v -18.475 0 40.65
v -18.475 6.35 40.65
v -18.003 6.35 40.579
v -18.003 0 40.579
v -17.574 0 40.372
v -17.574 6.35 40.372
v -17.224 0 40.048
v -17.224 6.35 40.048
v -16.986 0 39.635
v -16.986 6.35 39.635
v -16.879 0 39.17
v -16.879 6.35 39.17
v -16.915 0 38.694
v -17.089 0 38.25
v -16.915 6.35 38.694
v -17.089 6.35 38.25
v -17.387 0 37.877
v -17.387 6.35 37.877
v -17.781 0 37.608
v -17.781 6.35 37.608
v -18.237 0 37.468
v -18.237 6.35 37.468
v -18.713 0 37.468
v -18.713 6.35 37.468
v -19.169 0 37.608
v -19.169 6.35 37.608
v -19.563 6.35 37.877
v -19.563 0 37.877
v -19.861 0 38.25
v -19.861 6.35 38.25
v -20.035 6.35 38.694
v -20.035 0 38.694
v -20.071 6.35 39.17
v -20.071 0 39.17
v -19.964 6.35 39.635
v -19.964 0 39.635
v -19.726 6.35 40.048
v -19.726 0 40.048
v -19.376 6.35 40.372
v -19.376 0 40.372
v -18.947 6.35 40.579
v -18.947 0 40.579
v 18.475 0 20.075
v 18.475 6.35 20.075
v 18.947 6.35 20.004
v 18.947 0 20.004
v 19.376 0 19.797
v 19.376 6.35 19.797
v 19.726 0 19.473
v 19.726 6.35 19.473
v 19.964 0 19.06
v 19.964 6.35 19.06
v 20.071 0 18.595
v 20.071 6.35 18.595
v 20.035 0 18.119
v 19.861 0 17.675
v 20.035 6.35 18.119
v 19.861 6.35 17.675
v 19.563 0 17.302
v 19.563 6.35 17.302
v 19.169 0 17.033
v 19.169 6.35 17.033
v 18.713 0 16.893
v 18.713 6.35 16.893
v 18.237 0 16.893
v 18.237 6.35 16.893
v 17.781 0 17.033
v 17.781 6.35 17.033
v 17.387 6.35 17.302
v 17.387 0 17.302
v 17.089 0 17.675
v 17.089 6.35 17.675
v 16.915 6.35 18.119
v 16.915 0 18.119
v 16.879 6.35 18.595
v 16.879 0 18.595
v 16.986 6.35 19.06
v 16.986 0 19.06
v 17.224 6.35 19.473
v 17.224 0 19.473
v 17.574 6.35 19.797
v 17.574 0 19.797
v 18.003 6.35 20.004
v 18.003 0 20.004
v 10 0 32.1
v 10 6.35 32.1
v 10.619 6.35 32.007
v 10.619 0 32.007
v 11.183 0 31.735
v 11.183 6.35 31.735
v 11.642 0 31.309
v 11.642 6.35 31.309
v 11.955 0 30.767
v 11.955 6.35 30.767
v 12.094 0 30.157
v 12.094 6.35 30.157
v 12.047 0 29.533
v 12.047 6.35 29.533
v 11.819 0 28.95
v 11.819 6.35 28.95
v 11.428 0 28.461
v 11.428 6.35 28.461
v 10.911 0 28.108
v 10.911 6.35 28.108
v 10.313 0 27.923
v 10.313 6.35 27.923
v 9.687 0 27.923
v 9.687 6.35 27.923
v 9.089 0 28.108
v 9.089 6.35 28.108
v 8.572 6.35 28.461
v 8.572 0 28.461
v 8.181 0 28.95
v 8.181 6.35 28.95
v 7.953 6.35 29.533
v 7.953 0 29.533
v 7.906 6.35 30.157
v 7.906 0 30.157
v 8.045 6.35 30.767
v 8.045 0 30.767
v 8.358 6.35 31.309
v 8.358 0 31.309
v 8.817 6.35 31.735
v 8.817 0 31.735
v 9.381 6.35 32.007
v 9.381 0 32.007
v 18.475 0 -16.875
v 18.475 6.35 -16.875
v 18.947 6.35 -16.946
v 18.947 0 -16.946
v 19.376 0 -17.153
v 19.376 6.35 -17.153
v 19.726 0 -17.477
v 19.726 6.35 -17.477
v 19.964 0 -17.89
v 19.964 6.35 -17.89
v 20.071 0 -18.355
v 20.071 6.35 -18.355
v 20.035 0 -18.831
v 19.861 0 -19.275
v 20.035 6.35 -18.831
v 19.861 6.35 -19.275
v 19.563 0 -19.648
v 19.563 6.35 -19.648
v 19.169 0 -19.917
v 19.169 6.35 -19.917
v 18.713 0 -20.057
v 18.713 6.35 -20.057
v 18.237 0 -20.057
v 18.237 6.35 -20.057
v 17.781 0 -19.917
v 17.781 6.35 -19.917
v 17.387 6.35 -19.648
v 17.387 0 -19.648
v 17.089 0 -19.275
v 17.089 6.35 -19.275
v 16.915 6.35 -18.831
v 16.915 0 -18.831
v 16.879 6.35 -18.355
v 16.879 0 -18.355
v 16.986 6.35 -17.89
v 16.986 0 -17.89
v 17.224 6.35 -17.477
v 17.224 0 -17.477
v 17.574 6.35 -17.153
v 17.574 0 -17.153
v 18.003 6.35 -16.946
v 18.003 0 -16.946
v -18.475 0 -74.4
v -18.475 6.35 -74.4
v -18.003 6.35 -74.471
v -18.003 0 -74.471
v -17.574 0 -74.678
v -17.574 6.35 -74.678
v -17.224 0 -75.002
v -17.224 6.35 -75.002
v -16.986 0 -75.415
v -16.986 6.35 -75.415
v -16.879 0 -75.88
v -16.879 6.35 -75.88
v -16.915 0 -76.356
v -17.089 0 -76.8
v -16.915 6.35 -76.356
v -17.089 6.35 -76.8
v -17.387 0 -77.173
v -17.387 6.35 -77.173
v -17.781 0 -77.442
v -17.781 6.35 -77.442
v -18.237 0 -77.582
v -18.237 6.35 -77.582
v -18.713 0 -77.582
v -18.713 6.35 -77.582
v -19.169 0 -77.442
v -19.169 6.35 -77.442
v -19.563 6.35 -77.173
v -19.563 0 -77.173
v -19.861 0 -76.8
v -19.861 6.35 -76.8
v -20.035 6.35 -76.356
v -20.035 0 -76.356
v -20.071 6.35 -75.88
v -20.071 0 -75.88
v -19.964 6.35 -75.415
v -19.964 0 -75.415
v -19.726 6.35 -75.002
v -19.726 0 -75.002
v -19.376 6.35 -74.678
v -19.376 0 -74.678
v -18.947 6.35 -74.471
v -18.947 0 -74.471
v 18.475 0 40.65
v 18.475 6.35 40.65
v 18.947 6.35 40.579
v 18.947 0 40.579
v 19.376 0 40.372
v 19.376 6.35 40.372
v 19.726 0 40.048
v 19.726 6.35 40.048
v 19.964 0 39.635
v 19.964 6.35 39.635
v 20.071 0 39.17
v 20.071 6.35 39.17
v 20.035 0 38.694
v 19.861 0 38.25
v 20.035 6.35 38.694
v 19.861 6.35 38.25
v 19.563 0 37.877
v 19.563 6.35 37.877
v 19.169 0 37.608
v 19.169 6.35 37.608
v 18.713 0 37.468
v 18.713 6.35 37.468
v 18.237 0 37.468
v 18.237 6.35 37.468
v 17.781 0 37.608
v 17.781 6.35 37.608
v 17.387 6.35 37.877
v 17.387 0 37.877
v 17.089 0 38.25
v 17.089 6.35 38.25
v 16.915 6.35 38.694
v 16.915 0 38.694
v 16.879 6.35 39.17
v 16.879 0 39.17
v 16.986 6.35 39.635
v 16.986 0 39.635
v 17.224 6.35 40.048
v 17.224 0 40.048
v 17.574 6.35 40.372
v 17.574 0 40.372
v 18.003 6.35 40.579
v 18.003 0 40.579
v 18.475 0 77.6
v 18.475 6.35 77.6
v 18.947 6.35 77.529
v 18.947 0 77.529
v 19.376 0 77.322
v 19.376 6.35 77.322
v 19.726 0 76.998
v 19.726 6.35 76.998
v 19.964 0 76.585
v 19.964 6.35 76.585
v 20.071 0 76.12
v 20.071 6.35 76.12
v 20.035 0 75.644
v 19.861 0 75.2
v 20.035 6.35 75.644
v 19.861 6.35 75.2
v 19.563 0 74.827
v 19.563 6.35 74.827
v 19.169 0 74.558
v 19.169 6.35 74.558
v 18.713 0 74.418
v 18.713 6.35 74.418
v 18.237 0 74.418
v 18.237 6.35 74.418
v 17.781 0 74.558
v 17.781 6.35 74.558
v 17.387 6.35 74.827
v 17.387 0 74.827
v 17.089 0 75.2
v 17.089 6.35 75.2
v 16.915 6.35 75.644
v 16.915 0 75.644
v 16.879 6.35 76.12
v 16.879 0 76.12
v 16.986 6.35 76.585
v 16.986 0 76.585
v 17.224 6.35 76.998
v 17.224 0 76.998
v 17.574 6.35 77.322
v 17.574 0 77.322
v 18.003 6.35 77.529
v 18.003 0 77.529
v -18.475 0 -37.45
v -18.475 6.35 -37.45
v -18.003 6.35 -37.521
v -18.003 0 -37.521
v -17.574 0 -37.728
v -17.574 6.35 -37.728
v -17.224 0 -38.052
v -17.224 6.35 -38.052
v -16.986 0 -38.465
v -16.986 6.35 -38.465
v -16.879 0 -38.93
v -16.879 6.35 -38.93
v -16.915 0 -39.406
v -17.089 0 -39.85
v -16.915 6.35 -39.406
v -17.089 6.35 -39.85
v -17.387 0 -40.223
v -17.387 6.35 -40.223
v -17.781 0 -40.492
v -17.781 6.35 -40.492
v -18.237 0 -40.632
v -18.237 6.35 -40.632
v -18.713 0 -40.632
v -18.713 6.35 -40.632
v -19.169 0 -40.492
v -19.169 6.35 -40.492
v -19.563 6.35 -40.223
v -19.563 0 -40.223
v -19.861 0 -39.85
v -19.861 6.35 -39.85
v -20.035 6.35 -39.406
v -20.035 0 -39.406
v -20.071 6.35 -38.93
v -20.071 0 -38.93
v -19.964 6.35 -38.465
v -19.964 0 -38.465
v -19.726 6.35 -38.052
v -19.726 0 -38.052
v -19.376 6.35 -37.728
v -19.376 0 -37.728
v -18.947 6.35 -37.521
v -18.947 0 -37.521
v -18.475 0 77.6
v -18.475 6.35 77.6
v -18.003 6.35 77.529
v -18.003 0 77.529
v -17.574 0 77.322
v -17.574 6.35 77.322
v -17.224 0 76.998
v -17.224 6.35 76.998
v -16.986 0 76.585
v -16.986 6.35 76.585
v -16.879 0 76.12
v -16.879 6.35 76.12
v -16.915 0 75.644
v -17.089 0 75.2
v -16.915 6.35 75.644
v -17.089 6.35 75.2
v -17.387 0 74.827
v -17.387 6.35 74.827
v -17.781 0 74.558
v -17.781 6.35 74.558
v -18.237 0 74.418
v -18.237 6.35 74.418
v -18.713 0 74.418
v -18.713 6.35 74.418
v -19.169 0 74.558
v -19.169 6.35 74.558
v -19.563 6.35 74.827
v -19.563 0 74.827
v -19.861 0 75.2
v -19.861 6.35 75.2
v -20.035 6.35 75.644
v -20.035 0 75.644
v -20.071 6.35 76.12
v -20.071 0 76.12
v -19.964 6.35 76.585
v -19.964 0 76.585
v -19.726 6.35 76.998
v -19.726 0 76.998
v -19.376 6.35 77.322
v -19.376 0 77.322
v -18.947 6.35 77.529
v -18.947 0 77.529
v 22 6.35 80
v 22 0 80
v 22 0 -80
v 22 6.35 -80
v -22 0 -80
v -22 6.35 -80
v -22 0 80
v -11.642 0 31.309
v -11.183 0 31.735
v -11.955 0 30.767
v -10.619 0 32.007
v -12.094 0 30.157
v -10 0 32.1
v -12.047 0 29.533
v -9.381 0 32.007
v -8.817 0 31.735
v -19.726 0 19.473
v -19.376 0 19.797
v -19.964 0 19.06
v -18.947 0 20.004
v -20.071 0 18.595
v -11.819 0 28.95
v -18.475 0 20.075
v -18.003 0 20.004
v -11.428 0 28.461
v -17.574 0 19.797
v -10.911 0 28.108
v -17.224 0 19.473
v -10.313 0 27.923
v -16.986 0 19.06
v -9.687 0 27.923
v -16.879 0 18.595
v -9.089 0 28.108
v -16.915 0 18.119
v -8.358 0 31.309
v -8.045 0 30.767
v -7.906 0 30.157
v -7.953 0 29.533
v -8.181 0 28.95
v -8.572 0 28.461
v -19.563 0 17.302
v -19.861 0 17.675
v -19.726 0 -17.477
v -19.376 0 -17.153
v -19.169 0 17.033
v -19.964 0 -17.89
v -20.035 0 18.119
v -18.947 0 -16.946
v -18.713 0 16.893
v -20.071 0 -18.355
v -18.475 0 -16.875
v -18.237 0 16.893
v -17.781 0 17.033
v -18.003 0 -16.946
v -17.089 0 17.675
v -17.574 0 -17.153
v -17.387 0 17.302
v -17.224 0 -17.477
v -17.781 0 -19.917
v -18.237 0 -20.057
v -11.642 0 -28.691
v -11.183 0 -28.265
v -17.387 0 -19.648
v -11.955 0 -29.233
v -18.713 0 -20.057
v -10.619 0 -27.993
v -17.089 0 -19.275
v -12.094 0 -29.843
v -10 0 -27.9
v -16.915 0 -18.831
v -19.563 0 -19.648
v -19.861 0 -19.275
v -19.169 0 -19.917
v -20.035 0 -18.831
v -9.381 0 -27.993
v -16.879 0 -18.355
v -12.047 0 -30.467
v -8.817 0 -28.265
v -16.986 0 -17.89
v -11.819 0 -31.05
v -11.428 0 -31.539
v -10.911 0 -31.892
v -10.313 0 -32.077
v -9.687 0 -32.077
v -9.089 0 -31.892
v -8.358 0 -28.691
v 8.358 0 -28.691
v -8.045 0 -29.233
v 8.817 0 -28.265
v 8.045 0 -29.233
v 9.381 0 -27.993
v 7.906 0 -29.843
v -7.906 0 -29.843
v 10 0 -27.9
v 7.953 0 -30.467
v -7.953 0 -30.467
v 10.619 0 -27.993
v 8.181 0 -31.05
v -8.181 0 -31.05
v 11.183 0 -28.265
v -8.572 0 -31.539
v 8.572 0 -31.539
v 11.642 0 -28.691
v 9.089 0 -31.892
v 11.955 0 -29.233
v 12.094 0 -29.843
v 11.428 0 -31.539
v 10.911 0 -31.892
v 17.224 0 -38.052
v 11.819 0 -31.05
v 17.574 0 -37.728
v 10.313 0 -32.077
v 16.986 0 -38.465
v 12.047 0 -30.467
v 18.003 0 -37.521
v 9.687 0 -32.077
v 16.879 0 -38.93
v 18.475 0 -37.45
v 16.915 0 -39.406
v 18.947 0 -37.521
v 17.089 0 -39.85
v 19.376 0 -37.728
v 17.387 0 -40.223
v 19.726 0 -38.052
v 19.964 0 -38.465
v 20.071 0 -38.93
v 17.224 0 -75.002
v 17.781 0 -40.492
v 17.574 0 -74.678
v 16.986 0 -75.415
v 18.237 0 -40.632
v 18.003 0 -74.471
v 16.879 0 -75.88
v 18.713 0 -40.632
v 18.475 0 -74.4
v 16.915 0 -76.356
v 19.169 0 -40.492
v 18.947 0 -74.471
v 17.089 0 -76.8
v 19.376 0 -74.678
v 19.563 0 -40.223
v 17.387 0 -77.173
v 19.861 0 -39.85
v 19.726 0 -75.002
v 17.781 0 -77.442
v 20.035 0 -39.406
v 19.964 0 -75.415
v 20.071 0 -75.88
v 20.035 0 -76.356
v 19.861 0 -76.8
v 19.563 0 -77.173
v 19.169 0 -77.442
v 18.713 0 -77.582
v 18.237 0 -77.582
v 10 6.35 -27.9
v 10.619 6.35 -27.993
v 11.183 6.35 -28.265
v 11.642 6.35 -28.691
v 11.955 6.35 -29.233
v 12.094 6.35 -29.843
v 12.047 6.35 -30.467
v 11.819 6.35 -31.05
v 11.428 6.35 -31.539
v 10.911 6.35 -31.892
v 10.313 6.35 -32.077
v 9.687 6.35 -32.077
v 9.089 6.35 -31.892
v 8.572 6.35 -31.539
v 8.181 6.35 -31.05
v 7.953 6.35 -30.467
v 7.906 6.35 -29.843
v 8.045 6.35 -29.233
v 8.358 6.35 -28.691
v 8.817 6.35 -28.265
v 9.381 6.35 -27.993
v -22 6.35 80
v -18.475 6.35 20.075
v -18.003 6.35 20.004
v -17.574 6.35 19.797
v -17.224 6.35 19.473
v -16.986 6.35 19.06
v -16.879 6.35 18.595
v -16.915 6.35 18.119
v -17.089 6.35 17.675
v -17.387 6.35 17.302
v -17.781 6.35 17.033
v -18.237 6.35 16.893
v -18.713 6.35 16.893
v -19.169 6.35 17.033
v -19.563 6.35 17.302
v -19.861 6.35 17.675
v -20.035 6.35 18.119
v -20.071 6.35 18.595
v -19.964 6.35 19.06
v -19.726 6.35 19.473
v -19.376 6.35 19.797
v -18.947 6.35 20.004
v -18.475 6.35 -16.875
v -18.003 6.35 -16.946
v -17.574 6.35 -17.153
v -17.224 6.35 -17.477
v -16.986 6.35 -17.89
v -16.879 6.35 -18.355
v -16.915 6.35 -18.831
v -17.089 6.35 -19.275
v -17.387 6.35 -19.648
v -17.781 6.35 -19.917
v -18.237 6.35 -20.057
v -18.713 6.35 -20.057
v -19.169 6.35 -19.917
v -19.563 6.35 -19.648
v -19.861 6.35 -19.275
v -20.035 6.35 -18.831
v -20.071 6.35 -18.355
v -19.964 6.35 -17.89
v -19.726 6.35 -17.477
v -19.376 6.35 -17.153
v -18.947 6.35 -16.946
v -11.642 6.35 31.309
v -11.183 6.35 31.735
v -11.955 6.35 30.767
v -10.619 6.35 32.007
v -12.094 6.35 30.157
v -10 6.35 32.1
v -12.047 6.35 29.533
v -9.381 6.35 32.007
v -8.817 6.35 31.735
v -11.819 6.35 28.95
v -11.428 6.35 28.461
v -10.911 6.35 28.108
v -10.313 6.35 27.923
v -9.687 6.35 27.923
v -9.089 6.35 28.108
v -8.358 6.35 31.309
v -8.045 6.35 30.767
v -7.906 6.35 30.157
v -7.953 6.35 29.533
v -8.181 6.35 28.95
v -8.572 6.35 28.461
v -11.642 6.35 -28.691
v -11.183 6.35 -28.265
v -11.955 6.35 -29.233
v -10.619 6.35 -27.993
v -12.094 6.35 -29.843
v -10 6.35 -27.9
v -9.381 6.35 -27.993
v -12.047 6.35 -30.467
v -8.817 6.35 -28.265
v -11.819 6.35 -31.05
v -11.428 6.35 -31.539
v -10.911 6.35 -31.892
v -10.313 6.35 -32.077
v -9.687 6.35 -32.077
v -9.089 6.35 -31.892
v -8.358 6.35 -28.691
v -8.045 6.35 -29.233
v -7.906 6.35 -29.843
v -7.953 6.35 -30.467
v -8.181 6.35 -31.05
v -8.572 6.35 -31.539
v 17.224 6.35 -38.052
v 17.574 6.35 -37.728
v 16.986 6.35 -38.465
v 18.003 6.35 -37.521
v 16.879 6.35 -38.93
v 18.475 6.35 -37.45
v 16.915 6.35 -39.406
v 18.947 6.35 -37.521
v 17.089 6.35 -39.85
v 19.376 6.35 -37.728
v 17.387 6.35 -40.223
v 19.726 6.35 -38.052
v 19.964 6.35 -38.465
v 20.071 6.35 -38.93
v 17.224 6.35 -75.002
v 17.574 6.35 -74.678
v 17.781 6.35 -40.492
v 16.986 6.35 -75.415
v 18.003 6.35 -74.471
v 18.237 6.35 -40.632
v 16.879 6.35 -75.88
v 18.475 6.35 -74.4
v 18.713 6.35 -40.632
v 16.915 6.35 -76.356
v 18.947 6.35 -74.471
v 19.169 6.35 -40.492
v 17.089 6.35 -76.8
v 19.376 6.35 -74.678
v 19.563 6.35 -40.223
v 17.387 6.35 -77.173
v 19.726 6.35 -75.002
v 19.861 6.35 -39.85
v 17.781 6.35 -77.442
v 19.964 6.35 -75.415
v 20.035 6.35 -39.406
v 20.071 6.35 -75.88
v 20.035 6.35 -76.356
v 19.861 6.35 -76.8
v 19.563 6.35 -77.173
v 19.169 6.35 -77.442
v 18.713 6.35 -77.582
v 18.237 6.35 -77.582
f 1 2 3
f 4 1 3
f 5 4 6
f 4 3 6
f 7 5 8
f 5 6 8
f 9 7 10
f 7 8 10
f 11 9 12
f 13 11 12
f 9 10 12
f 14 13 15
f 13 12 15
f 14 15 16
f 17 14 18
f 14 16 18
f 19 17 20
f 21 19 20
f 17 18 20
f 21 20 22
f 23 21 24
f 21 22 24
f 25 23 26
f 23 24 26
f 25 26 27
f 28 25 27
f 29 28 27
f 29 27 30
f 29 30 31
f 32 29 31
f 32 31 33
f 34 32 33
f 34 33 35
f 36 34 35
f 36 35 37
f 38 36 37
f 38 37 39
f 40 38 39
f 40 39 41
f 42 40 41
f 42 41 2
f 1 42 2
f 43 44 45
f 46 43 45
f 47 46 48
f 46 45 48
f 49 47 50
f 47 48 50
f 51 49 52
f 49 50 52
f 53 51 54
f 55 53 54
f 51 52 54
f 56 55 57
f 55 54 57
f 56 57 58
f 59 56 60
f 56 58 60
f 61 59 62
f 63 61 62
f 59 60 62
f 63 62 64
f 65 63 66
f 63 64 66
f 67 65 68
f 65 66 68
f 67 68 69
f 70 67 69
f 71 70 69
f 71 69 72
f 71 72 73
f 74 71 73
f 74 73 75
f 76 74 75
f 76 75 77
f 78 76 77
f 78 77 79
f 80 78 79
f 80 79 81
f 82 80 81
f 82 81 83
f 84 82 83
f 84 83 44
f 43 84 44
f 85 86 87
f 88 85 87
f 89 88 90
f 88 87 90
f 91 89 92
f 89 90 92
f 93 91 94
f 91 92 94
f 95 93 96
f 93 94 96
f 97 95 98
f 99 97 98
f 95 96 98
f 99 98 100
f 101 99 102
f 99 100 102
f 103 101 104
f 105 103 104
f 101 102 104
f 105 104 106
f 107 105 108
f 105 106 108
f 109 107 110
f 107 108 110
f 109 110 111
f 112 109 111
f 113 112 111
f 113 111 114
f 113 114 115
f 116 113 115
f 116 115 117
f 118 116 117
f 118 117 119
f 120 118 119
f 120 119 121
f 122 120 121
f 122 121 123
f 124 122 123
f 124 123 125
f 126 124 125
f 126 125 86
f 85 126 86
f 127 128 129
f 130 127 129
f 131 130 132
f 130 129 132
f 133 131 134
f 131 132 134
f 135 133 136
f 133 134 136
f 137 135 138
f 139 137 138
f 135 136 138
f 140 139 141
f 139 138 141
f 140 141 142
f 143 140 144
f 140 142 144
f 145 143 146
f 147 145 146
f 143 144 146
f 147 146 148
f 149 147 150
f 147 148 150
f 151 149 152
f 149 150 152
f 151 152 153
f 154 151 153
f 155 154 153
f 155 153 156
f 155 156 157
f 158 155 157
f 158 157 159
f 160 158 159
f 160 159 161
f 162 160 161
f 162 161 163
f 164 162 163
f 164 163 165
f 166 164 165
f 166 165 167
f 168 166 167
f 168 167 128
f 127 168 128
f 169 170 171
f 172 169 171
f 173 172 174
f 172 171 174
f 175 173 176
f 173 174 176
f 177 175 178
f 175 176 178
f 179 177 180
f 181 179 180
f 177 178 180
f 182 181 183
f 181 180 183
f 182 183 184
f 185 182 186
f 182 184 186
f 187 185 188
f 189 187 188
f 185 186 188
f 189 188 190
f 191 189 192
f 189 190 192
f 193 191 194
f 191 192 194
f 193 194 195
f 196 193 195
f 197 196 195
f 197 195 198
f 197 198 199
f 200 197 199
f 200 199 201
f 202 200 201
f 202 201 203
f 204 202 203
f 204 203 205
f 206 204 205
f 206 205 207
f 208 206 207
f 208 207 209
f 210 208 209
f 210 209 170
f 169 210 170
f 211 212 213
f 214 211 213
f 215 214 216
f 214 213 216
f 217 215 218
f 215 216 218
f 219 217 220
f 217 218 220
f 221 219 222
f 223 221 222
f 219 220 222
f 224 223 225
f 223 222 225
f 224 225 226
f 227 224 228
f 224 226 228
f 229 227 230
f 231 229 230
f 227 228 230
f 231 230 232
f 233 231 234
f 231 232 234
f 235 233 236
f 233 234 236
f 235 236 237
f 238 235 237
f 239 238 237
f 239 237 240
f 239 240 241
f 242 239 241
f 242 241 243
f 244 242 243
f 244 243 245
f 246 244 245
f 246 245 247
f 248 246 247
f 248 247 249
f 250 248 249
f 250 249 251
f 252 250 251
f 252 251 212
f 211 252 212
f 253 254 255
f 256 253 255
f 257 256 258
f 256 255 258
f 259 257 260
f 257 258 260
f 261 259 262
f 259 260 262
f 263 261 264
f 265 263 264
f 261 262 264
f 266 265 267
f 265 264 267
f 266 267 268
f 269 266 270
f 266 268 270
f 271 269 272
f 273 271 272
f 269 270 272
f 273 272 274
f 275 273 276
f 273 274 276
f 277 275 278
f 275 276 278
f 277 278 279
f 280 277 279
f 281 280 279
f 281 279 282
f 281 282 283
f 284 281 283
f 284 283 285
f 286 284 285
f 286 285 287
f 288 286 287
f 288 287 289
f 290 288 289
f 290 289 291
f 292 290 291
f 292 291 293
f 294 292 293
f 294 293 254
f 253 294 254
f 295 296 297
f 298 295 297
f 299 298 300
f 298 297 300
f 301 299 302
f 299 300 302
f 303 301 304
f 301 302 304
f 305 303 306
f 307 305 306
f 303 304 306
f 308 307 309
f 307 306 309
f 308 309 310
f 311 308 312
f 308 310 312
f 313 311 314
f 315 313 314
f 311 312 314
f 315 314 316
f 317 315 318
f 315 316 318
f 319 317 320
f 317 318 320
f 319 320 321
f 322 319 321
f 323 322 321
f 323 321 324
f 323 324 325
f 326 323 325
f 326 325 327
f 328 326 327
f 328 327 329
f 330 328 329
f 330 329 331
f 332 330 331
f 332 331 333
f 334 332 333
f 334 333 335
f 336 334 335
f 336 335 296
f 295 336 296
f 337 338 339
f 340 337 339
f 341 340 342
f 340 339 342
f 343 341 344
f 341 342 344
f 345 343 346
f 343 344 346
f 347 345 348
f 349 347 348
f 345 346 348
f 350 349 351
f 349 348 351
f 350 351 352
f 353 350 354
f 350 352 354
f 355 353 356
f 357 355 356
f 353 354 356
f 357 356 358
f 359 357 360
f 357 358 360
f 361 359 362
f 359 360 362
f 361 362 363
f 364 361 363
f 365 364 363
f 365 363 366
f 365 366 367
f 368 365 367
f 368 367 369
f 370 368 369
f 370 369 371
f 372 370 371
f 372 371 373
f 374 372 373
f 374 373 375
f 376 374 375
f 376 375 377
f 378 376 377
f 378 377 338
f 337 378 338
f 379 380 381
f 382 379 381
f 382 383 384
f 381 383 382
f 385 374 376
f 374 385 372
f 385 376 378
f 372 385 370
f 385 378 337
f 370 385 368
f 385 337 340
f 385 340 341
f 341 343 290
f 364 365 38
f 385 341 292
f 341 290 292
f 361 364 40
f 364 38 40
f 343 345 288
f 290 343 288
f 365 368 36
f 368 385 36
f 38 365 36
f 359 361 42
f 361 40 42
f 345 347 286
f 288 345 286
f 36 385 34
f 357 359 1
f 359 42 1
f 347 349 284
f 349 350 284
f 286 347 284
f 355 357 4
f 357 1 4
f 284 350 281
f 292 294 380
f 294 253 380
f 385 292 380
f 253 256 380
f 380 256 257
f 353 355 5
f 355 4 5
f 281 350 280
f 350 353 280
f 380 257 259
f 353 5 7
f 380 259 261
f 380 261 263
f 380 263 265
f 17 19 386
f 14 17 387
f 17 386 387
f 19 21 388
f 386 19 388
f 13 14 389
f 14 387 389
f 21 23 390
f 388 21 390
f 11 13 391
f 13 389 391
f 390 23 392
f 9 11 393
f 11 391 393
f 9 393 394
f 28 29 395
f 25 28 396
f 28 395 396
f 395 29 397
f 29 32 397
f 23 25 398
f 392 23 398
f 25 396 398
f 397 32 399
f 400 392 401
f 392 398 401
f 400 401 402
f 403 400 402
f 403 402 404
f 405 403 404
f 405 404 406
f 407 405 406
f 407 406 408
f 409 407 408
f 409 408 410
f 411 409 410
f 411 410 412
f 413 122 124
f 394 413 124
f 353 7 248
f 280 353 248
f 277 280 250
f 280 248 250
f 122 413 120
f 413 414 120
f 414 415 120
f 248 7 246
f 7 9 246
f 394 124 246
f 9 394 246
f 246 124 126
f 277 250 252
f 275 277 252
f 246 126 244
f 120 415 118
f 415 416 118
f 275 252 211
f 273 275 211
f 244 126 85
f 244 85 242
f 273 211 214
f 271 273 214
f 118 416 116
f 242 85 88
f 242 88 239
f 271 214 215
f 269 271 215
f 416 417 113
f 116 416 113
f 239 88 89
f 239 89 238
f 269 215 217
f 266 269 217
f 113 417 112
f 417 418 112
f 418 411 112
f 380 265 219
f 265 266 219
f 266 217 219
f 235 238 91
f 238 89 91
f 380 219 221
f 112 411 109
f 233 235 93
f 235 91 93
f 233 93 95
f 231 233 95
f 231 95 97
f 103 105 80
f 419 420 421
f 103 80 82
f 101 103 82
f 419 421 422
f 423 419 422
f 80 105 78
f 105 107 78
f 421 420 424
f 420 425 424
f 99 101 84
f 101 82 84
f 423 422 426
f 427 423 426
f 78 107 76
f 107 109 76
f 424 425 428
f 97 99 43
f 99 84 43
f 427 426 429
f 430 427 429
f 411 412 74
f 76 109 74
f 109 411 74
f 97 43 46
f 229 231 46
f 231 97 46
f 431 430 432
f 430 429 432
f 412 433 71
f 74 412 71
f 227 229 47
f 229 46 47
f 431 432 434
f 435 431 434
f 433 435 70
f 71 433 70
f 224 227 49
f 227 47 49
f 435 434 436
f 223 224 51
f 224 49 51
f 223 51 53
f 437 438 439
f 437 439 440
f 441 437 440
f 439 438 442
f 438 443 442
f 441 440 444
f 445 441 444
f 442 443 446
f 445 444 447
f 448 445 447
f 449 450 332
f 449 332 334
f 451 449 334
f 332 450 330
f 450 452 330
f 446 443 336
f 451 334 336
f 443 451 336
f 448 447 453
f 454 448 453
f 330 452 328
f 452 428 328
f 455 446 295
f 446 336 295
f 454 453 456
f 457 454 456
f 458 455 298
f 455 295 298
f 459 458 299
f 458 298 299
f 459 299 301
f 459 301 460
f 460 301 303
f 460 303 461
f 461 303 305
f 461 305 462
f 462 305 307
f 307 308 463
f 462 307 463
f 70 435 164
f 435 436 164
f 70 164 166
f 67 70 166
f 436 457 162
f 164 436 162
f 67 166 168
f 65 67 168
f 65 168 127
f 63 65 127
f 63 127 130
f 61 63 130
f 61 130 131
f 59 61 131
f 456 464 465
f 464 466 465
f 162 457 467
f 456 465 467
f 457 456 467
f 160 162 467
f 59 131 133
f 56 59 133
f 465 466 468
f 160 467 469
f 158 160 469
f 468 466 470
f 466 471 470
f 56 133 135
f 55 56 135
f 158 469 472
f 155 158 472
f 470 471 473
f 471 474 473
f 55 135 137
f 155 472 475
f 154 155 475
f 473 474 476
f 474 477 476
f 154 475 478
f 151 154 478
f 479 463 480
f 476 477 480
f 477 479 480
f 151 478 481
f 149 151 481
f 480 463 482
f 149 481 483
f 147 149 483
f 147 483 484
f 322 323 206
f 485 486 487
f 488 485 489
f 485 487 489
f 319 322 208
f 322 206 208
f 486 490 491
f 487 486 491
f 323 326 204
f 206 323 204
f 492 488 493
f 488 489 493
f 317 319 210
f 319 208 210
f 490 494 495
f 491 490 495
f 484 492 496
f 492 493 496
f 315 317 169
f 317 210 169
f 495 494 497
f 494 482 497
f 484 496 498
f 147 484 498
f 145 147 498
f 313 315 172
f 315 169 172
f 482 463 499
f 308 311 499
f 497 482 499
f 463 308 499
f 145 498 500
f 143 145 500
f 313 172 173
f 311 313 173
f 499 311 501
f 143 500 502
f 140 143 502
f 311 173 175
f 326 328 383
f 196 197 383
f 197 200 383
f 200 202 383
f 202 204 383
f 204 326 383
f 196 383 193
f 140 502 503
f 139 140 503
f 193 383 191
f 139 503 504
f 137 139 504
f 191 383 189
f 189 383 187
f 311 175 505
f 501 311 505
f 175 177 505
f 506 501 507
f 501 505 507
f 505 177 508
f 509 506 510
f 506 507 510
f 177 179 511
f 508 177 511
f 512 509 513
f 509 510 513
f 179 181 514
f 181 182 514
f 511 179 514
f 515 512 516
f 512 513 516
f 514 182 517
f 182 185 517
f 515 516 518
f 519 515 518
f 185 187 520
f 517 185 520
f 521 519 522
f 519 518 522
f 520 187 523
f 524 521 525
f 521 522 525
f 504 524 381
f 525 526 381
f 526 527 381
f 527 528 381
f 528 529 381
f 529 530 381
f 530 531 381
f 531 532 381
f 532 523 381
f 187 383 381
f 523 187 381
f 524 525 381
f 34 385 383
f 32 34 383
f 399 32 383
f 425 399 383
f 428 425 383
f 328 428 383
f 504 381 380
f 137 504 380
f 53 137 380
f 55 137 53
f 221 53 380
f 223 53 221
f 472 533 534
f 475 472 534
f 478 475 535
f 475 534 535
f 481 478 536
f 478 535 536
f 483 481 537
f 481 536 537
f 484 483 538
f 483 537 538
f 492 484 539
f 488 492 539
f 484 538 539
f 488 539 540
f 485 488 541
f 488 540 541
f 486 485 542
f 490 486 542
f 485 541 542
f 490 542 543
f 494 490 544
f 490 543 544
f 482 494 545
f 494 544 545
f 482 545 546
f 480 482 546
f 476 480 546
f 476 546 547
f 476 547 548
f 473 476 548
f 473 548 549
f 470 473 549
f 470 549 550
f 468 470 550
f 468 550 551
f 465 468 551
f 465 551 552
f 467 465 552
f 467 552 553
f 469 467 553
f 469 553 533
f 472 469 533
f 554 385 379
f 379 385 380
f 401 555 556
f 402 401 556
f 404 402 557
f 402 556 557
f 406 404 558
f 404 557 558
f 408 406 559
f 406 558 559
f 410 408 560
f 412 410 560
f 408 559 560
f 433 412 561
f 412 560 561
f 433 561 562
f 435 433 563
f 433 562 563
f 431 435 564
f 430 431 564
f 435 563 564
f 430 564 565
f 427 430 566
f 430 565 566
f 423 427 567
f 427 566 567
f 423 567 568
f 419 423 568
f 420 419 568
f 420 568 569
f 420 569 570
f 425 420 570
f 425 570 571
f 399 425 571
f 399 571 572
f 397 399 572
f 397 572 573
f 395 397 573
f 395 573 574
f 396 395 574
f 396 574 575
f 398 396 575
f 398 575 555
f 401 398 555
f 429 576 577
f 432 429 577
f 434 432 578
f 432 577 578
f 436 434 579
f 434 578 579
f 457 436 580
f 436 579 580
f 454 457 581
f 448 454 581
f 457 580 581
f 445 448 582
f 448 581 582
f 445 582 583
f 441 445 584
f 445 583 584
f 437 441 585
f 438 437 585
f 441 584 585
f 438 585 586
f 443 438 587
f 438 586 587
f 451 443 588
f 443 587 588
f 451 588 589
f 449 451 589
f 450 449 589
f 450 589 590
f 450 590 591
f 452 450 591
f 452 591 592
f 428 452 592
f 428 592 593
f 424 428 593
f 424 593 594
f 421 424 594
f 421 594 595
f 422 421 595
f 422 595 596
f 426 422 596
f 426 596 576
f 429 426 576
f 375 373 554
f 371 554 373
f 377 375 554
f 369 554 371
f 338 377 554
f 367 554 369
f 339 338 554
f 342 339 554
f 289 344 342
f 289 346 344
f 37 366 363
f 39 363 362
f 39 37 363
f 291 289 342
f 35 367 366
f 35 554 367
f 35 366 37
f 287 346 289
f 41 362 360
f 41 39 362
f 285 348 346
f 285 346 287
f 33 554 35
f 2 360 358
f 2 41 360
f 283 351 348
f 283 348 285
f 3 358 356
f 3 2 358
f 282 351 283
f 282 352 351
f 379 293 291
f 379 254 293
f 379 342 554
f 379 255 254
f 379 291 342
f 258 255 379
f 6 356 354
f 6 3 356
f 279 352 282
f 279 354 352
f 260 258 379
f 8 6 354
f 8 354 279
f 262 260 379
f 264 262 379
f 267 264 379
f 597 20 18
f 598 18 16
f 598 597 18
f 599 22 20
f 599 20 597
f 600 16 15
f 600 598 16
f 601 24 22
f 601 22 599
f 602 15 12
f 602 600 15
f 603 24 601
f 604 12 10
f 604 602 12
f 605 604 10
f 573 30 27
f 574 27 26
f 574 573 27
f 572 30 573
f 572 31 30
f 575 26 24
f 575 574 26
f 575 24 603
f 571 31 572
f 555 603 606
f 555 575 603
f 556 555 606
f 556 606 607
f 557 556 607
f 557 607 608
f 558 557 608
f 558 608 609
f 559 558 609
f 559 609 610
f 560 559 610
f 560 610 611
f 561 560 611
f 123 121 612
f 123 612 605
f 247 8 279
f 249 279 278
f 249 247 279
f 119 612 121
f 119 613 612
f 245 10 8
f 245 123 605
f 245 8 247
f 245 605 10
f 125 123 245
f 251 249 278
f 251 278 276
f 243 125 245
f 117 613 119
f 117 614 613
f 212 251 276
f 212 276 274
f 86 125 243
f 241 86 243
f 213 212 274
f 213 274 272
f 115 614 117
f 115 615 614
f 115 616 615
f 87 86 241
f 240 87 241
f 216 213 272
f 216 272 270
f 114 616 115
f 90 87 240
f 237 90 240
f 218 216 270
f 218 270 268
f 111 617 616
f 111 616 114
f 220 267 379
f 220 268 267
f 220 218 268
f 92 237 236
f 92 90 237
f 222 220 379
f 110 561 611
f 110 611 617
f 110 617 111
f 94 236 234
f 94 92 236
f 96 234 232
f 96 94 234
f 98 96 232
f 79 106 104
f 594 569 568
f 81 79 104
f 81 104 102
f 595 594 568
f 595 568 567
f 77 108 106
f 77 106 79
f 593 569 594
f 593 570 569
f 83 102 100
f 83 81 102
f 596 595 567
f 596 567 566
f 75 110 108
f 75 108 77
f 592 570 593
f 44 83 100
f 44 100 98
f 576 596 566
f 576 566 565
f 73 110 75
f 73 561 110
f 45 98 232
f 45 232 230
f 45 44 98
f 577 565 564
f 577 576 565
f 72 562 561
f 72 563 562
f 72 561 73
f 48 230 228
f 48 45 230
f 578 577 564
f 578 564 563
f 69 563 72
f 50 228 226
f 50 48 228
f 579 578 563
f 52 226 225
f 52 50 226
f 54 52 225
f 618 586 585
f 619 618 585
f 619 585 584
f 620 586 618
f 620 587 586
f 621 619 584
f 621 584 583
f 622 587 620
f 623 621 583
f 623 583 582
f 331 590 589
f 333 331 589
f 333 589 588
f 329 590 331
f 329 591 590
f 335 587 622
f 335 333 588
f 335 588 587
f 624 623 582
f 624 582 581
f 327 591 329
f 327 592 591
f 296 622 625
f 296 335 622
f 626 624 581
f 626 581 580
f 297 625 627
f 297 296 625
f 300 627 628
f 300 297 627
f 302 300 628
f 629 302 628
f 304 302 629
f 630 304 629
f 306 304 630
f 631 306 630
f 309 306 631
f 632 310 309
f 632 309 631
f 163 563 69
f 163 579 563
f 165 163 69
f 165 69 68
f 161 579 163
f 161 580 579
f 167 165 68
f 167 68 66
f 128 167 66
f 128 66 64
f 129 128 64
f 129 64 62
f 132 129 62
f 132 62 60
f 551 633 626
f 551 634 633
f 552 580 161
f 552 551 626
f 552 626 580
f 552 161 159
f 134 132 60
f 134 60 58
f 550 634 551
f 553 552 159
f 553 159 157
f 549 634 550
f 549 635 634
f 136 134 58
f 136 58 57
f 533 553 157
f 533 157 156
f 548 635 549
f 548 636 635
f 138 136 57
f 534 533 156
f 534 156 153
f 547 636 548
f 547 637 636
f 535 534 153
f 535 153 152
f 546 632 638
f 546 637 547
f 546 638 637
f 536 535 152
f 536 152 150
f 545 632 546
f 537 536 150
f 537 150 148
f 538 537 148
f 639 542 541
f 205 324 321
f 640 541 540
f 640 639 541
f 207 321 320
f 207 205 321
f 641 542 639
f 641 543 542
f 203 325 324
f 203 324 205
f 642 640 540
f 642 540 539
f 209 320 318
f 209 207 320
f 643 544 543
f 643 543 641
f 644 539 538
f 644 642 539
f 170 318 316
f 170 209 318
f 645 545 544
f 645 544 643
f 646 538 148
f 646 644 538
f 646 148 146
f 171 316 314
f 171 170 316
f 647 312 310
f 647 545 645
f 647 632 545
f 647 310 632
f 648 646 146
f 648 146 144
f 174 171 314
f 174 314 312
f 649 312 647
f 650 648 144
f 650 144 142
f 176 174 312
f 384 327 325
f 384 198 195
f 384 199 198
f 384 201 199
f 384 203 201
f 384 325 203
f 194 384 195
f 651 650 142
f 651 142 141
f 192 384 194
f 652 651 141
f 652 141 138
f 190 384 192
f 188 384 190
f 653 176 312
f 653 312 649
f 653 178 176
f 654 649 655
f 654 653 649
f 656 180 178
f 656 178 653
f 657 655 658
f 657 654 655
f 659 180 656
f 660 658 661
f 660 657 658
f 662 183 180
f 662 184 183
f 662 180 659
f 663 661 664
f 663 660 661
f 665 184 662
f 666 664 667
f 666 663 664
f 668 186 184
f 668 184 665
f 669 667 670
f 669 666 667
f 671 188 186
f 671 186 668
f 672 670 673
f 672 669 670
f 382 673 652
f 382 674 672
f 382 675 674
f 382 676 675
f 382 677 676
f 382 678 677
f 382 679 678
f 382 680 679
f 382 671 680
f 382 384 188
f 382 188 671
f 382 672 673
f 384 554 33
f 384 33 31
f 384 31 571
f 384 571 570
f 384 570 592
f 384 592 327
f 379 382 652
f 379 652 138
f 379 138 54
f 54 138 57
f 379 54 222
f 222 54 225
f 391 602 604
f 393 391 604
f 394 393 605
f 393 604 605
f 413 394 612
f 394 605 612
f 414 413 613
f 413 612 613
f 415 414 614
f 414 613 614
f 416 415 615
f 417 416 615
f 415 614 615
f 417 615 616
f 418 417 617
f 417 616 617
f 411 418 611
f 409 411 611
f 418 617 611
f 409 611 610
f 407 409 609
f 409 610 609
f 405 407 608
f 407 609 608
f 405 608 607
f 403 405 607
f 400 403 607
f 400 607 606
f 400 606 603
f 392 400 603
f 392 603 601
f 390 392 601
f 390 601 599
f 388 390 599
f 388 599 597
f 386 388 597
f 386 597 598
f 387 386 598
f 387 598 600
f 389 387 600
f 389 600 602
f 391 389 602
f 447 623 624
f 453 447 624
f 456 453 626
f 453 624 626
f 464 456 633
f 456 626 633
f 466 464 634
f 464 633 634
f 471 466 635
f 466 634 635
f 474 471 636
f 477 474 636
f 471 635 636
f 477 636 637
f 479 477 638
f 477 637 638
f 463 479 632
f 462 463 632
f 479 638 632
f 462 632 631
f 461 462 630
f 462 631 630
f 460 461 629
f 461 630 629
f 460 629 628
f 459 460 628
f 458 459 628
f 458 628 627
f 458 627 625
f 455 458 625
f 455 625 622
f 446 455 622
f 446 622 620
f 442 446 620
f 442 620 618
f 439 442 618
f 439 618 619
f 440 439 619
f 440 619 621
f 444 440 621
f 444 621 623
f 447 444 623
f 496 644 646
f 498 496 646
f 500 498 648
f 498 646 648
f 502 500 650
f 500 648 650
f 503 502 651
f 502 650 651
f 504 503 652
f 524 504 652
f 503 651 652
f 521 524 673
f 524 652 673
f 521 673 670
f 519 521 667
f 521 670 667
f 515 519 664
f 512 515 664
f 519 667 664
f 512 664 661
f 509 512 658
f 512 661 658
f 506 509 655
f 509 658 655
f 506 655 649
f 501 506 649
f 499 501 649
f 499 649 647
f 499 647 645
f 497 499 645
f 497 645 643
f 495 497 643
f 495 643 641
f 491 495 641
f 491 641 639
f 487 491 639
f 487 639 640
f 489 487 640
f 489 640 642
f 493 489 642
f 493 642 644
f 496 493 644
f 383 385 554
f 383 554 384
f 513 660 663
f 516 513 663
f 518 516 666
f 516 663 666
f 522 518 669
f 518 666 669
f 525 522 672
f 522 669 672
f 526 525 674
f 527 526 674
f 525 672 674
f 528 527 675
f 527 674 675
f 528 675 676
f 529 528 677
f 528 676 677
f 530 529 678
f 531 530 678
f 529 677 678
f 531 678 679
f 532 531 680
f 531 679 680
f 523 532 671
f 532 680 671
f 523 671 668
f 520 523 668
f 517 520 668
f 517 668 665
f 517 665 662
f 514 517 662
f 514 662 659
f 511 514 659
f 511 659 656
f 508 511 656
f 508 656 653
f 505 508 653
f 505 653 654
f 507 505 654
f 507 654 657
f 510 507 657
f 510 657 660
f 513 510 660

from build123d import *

# Parameters (mm, degrees)
SKETCH1_W           = 44
SKETCH1_H           = 160
BOSS_EXTRUDE1_DEPTH = 6.35
SKETCH2_R           = 1.6
CUT_EXTRUDE1_DEPTH  = 84.212514083
SKETCH3_R           = 2.1
CUT_EXTRUDE2_DEPTH  = 84.212514083


with BuildPart() as part:
    # Sketch1 → Boss-Extrude1 (new body)
    with BuildSketch(Plane(origin=(0, 0, 0), x_dir=(1, 0, 0), z_dir=(0, 1, 0))):
        Rectangle(SKETCH1_W, SKETCH1_H)
    extrude(amount=BOSS_EXTRUDE1_DEPTH)

    # Sketch2 → Cut-Extrude1 (cut, through all)
    with BuildSketch(Plane(origin=(0, 6.35, 0), x_dir=(1, 0, 0), z_dir=(0, 1, 0))):
        with Locations(Location((-18.475, 18.475, 0), (0, 0, 270))):
            Circle(SKETCH2_R)
        with Locations(Location((-18.475, -18.475, 0), (0, 0, 270))):
            Circle(SKETCH2_R)
        with Locations(Location((18.475, -18.475, 0), (0, 0, 270))):
            Circle(SKETCH2_R)
        with Locations(Location((18.475, 18.475, 0), (0, 0, 270))):
            Circle(SKETCH2_R)
        with Locations(Location((-18.475, 76, 0), (0, 0, 270))):
            Circle(SKETCH2_R)
        with Locations(Location((-18.475, 39.05, 0), (0, 0, 270))):
            Circle(SKETCH2_R)
        with Locations(Location((18.475, 39.05, 0), (0, 0, 270))):
            Circle(SKETCH2_R)
        with Locations(Location((18.475, 76, 0), (0, 0, 270))):
            Circle(SKETCH2_R)
        with Locations(Location((-18.475, -39.05, 0), (0, 0, 270))):
            Circle(SKETCH2_R)
        with Locations(Location((-18.475, -76, 0), (0, 0, 270))):
            Circle(SKETCH2_R)
        with Locations(Location((18.475, -76, 0), (0, 0, 270))):
            Circle(SKETCH2_R)
        with Locations(Location((18.475, -39.05, 0), (0, 0, 270))):
            Circle(SKETCH2_R)
    extrude(amount=-CUT_EXTRUDE1_DEPTH, mode=Mode.SUBTRACT)

    # Sketch3 → Cut-Extrude2 (cut, through all)
    with BuildSketch(Plane(origin=(0, 6.35, 0), x_dir=(1, 0, 0), z_dir=(0, 1, 0))):
        with Locations(Location((-10, 30, 0), (0, 0, 270))):
            Circle(SKETCH3_R)
        with Locations(Location((10, 30, 0), (0, 0, 270))):
            Circle(SKETCH3_R)
        with Locations(Location((-10, -30, 0), (0, 0, 270))):
            Circle(SKETCH3_R)
        with Locations(Location((10, -30, 0), (0, 0, 270))):
            Circle(SKETCH3_R)
    extrude(amount=-CUT_EXTRUDE2_DEPTH, mode=Mode.SUBTRACT)


solid = part.part
